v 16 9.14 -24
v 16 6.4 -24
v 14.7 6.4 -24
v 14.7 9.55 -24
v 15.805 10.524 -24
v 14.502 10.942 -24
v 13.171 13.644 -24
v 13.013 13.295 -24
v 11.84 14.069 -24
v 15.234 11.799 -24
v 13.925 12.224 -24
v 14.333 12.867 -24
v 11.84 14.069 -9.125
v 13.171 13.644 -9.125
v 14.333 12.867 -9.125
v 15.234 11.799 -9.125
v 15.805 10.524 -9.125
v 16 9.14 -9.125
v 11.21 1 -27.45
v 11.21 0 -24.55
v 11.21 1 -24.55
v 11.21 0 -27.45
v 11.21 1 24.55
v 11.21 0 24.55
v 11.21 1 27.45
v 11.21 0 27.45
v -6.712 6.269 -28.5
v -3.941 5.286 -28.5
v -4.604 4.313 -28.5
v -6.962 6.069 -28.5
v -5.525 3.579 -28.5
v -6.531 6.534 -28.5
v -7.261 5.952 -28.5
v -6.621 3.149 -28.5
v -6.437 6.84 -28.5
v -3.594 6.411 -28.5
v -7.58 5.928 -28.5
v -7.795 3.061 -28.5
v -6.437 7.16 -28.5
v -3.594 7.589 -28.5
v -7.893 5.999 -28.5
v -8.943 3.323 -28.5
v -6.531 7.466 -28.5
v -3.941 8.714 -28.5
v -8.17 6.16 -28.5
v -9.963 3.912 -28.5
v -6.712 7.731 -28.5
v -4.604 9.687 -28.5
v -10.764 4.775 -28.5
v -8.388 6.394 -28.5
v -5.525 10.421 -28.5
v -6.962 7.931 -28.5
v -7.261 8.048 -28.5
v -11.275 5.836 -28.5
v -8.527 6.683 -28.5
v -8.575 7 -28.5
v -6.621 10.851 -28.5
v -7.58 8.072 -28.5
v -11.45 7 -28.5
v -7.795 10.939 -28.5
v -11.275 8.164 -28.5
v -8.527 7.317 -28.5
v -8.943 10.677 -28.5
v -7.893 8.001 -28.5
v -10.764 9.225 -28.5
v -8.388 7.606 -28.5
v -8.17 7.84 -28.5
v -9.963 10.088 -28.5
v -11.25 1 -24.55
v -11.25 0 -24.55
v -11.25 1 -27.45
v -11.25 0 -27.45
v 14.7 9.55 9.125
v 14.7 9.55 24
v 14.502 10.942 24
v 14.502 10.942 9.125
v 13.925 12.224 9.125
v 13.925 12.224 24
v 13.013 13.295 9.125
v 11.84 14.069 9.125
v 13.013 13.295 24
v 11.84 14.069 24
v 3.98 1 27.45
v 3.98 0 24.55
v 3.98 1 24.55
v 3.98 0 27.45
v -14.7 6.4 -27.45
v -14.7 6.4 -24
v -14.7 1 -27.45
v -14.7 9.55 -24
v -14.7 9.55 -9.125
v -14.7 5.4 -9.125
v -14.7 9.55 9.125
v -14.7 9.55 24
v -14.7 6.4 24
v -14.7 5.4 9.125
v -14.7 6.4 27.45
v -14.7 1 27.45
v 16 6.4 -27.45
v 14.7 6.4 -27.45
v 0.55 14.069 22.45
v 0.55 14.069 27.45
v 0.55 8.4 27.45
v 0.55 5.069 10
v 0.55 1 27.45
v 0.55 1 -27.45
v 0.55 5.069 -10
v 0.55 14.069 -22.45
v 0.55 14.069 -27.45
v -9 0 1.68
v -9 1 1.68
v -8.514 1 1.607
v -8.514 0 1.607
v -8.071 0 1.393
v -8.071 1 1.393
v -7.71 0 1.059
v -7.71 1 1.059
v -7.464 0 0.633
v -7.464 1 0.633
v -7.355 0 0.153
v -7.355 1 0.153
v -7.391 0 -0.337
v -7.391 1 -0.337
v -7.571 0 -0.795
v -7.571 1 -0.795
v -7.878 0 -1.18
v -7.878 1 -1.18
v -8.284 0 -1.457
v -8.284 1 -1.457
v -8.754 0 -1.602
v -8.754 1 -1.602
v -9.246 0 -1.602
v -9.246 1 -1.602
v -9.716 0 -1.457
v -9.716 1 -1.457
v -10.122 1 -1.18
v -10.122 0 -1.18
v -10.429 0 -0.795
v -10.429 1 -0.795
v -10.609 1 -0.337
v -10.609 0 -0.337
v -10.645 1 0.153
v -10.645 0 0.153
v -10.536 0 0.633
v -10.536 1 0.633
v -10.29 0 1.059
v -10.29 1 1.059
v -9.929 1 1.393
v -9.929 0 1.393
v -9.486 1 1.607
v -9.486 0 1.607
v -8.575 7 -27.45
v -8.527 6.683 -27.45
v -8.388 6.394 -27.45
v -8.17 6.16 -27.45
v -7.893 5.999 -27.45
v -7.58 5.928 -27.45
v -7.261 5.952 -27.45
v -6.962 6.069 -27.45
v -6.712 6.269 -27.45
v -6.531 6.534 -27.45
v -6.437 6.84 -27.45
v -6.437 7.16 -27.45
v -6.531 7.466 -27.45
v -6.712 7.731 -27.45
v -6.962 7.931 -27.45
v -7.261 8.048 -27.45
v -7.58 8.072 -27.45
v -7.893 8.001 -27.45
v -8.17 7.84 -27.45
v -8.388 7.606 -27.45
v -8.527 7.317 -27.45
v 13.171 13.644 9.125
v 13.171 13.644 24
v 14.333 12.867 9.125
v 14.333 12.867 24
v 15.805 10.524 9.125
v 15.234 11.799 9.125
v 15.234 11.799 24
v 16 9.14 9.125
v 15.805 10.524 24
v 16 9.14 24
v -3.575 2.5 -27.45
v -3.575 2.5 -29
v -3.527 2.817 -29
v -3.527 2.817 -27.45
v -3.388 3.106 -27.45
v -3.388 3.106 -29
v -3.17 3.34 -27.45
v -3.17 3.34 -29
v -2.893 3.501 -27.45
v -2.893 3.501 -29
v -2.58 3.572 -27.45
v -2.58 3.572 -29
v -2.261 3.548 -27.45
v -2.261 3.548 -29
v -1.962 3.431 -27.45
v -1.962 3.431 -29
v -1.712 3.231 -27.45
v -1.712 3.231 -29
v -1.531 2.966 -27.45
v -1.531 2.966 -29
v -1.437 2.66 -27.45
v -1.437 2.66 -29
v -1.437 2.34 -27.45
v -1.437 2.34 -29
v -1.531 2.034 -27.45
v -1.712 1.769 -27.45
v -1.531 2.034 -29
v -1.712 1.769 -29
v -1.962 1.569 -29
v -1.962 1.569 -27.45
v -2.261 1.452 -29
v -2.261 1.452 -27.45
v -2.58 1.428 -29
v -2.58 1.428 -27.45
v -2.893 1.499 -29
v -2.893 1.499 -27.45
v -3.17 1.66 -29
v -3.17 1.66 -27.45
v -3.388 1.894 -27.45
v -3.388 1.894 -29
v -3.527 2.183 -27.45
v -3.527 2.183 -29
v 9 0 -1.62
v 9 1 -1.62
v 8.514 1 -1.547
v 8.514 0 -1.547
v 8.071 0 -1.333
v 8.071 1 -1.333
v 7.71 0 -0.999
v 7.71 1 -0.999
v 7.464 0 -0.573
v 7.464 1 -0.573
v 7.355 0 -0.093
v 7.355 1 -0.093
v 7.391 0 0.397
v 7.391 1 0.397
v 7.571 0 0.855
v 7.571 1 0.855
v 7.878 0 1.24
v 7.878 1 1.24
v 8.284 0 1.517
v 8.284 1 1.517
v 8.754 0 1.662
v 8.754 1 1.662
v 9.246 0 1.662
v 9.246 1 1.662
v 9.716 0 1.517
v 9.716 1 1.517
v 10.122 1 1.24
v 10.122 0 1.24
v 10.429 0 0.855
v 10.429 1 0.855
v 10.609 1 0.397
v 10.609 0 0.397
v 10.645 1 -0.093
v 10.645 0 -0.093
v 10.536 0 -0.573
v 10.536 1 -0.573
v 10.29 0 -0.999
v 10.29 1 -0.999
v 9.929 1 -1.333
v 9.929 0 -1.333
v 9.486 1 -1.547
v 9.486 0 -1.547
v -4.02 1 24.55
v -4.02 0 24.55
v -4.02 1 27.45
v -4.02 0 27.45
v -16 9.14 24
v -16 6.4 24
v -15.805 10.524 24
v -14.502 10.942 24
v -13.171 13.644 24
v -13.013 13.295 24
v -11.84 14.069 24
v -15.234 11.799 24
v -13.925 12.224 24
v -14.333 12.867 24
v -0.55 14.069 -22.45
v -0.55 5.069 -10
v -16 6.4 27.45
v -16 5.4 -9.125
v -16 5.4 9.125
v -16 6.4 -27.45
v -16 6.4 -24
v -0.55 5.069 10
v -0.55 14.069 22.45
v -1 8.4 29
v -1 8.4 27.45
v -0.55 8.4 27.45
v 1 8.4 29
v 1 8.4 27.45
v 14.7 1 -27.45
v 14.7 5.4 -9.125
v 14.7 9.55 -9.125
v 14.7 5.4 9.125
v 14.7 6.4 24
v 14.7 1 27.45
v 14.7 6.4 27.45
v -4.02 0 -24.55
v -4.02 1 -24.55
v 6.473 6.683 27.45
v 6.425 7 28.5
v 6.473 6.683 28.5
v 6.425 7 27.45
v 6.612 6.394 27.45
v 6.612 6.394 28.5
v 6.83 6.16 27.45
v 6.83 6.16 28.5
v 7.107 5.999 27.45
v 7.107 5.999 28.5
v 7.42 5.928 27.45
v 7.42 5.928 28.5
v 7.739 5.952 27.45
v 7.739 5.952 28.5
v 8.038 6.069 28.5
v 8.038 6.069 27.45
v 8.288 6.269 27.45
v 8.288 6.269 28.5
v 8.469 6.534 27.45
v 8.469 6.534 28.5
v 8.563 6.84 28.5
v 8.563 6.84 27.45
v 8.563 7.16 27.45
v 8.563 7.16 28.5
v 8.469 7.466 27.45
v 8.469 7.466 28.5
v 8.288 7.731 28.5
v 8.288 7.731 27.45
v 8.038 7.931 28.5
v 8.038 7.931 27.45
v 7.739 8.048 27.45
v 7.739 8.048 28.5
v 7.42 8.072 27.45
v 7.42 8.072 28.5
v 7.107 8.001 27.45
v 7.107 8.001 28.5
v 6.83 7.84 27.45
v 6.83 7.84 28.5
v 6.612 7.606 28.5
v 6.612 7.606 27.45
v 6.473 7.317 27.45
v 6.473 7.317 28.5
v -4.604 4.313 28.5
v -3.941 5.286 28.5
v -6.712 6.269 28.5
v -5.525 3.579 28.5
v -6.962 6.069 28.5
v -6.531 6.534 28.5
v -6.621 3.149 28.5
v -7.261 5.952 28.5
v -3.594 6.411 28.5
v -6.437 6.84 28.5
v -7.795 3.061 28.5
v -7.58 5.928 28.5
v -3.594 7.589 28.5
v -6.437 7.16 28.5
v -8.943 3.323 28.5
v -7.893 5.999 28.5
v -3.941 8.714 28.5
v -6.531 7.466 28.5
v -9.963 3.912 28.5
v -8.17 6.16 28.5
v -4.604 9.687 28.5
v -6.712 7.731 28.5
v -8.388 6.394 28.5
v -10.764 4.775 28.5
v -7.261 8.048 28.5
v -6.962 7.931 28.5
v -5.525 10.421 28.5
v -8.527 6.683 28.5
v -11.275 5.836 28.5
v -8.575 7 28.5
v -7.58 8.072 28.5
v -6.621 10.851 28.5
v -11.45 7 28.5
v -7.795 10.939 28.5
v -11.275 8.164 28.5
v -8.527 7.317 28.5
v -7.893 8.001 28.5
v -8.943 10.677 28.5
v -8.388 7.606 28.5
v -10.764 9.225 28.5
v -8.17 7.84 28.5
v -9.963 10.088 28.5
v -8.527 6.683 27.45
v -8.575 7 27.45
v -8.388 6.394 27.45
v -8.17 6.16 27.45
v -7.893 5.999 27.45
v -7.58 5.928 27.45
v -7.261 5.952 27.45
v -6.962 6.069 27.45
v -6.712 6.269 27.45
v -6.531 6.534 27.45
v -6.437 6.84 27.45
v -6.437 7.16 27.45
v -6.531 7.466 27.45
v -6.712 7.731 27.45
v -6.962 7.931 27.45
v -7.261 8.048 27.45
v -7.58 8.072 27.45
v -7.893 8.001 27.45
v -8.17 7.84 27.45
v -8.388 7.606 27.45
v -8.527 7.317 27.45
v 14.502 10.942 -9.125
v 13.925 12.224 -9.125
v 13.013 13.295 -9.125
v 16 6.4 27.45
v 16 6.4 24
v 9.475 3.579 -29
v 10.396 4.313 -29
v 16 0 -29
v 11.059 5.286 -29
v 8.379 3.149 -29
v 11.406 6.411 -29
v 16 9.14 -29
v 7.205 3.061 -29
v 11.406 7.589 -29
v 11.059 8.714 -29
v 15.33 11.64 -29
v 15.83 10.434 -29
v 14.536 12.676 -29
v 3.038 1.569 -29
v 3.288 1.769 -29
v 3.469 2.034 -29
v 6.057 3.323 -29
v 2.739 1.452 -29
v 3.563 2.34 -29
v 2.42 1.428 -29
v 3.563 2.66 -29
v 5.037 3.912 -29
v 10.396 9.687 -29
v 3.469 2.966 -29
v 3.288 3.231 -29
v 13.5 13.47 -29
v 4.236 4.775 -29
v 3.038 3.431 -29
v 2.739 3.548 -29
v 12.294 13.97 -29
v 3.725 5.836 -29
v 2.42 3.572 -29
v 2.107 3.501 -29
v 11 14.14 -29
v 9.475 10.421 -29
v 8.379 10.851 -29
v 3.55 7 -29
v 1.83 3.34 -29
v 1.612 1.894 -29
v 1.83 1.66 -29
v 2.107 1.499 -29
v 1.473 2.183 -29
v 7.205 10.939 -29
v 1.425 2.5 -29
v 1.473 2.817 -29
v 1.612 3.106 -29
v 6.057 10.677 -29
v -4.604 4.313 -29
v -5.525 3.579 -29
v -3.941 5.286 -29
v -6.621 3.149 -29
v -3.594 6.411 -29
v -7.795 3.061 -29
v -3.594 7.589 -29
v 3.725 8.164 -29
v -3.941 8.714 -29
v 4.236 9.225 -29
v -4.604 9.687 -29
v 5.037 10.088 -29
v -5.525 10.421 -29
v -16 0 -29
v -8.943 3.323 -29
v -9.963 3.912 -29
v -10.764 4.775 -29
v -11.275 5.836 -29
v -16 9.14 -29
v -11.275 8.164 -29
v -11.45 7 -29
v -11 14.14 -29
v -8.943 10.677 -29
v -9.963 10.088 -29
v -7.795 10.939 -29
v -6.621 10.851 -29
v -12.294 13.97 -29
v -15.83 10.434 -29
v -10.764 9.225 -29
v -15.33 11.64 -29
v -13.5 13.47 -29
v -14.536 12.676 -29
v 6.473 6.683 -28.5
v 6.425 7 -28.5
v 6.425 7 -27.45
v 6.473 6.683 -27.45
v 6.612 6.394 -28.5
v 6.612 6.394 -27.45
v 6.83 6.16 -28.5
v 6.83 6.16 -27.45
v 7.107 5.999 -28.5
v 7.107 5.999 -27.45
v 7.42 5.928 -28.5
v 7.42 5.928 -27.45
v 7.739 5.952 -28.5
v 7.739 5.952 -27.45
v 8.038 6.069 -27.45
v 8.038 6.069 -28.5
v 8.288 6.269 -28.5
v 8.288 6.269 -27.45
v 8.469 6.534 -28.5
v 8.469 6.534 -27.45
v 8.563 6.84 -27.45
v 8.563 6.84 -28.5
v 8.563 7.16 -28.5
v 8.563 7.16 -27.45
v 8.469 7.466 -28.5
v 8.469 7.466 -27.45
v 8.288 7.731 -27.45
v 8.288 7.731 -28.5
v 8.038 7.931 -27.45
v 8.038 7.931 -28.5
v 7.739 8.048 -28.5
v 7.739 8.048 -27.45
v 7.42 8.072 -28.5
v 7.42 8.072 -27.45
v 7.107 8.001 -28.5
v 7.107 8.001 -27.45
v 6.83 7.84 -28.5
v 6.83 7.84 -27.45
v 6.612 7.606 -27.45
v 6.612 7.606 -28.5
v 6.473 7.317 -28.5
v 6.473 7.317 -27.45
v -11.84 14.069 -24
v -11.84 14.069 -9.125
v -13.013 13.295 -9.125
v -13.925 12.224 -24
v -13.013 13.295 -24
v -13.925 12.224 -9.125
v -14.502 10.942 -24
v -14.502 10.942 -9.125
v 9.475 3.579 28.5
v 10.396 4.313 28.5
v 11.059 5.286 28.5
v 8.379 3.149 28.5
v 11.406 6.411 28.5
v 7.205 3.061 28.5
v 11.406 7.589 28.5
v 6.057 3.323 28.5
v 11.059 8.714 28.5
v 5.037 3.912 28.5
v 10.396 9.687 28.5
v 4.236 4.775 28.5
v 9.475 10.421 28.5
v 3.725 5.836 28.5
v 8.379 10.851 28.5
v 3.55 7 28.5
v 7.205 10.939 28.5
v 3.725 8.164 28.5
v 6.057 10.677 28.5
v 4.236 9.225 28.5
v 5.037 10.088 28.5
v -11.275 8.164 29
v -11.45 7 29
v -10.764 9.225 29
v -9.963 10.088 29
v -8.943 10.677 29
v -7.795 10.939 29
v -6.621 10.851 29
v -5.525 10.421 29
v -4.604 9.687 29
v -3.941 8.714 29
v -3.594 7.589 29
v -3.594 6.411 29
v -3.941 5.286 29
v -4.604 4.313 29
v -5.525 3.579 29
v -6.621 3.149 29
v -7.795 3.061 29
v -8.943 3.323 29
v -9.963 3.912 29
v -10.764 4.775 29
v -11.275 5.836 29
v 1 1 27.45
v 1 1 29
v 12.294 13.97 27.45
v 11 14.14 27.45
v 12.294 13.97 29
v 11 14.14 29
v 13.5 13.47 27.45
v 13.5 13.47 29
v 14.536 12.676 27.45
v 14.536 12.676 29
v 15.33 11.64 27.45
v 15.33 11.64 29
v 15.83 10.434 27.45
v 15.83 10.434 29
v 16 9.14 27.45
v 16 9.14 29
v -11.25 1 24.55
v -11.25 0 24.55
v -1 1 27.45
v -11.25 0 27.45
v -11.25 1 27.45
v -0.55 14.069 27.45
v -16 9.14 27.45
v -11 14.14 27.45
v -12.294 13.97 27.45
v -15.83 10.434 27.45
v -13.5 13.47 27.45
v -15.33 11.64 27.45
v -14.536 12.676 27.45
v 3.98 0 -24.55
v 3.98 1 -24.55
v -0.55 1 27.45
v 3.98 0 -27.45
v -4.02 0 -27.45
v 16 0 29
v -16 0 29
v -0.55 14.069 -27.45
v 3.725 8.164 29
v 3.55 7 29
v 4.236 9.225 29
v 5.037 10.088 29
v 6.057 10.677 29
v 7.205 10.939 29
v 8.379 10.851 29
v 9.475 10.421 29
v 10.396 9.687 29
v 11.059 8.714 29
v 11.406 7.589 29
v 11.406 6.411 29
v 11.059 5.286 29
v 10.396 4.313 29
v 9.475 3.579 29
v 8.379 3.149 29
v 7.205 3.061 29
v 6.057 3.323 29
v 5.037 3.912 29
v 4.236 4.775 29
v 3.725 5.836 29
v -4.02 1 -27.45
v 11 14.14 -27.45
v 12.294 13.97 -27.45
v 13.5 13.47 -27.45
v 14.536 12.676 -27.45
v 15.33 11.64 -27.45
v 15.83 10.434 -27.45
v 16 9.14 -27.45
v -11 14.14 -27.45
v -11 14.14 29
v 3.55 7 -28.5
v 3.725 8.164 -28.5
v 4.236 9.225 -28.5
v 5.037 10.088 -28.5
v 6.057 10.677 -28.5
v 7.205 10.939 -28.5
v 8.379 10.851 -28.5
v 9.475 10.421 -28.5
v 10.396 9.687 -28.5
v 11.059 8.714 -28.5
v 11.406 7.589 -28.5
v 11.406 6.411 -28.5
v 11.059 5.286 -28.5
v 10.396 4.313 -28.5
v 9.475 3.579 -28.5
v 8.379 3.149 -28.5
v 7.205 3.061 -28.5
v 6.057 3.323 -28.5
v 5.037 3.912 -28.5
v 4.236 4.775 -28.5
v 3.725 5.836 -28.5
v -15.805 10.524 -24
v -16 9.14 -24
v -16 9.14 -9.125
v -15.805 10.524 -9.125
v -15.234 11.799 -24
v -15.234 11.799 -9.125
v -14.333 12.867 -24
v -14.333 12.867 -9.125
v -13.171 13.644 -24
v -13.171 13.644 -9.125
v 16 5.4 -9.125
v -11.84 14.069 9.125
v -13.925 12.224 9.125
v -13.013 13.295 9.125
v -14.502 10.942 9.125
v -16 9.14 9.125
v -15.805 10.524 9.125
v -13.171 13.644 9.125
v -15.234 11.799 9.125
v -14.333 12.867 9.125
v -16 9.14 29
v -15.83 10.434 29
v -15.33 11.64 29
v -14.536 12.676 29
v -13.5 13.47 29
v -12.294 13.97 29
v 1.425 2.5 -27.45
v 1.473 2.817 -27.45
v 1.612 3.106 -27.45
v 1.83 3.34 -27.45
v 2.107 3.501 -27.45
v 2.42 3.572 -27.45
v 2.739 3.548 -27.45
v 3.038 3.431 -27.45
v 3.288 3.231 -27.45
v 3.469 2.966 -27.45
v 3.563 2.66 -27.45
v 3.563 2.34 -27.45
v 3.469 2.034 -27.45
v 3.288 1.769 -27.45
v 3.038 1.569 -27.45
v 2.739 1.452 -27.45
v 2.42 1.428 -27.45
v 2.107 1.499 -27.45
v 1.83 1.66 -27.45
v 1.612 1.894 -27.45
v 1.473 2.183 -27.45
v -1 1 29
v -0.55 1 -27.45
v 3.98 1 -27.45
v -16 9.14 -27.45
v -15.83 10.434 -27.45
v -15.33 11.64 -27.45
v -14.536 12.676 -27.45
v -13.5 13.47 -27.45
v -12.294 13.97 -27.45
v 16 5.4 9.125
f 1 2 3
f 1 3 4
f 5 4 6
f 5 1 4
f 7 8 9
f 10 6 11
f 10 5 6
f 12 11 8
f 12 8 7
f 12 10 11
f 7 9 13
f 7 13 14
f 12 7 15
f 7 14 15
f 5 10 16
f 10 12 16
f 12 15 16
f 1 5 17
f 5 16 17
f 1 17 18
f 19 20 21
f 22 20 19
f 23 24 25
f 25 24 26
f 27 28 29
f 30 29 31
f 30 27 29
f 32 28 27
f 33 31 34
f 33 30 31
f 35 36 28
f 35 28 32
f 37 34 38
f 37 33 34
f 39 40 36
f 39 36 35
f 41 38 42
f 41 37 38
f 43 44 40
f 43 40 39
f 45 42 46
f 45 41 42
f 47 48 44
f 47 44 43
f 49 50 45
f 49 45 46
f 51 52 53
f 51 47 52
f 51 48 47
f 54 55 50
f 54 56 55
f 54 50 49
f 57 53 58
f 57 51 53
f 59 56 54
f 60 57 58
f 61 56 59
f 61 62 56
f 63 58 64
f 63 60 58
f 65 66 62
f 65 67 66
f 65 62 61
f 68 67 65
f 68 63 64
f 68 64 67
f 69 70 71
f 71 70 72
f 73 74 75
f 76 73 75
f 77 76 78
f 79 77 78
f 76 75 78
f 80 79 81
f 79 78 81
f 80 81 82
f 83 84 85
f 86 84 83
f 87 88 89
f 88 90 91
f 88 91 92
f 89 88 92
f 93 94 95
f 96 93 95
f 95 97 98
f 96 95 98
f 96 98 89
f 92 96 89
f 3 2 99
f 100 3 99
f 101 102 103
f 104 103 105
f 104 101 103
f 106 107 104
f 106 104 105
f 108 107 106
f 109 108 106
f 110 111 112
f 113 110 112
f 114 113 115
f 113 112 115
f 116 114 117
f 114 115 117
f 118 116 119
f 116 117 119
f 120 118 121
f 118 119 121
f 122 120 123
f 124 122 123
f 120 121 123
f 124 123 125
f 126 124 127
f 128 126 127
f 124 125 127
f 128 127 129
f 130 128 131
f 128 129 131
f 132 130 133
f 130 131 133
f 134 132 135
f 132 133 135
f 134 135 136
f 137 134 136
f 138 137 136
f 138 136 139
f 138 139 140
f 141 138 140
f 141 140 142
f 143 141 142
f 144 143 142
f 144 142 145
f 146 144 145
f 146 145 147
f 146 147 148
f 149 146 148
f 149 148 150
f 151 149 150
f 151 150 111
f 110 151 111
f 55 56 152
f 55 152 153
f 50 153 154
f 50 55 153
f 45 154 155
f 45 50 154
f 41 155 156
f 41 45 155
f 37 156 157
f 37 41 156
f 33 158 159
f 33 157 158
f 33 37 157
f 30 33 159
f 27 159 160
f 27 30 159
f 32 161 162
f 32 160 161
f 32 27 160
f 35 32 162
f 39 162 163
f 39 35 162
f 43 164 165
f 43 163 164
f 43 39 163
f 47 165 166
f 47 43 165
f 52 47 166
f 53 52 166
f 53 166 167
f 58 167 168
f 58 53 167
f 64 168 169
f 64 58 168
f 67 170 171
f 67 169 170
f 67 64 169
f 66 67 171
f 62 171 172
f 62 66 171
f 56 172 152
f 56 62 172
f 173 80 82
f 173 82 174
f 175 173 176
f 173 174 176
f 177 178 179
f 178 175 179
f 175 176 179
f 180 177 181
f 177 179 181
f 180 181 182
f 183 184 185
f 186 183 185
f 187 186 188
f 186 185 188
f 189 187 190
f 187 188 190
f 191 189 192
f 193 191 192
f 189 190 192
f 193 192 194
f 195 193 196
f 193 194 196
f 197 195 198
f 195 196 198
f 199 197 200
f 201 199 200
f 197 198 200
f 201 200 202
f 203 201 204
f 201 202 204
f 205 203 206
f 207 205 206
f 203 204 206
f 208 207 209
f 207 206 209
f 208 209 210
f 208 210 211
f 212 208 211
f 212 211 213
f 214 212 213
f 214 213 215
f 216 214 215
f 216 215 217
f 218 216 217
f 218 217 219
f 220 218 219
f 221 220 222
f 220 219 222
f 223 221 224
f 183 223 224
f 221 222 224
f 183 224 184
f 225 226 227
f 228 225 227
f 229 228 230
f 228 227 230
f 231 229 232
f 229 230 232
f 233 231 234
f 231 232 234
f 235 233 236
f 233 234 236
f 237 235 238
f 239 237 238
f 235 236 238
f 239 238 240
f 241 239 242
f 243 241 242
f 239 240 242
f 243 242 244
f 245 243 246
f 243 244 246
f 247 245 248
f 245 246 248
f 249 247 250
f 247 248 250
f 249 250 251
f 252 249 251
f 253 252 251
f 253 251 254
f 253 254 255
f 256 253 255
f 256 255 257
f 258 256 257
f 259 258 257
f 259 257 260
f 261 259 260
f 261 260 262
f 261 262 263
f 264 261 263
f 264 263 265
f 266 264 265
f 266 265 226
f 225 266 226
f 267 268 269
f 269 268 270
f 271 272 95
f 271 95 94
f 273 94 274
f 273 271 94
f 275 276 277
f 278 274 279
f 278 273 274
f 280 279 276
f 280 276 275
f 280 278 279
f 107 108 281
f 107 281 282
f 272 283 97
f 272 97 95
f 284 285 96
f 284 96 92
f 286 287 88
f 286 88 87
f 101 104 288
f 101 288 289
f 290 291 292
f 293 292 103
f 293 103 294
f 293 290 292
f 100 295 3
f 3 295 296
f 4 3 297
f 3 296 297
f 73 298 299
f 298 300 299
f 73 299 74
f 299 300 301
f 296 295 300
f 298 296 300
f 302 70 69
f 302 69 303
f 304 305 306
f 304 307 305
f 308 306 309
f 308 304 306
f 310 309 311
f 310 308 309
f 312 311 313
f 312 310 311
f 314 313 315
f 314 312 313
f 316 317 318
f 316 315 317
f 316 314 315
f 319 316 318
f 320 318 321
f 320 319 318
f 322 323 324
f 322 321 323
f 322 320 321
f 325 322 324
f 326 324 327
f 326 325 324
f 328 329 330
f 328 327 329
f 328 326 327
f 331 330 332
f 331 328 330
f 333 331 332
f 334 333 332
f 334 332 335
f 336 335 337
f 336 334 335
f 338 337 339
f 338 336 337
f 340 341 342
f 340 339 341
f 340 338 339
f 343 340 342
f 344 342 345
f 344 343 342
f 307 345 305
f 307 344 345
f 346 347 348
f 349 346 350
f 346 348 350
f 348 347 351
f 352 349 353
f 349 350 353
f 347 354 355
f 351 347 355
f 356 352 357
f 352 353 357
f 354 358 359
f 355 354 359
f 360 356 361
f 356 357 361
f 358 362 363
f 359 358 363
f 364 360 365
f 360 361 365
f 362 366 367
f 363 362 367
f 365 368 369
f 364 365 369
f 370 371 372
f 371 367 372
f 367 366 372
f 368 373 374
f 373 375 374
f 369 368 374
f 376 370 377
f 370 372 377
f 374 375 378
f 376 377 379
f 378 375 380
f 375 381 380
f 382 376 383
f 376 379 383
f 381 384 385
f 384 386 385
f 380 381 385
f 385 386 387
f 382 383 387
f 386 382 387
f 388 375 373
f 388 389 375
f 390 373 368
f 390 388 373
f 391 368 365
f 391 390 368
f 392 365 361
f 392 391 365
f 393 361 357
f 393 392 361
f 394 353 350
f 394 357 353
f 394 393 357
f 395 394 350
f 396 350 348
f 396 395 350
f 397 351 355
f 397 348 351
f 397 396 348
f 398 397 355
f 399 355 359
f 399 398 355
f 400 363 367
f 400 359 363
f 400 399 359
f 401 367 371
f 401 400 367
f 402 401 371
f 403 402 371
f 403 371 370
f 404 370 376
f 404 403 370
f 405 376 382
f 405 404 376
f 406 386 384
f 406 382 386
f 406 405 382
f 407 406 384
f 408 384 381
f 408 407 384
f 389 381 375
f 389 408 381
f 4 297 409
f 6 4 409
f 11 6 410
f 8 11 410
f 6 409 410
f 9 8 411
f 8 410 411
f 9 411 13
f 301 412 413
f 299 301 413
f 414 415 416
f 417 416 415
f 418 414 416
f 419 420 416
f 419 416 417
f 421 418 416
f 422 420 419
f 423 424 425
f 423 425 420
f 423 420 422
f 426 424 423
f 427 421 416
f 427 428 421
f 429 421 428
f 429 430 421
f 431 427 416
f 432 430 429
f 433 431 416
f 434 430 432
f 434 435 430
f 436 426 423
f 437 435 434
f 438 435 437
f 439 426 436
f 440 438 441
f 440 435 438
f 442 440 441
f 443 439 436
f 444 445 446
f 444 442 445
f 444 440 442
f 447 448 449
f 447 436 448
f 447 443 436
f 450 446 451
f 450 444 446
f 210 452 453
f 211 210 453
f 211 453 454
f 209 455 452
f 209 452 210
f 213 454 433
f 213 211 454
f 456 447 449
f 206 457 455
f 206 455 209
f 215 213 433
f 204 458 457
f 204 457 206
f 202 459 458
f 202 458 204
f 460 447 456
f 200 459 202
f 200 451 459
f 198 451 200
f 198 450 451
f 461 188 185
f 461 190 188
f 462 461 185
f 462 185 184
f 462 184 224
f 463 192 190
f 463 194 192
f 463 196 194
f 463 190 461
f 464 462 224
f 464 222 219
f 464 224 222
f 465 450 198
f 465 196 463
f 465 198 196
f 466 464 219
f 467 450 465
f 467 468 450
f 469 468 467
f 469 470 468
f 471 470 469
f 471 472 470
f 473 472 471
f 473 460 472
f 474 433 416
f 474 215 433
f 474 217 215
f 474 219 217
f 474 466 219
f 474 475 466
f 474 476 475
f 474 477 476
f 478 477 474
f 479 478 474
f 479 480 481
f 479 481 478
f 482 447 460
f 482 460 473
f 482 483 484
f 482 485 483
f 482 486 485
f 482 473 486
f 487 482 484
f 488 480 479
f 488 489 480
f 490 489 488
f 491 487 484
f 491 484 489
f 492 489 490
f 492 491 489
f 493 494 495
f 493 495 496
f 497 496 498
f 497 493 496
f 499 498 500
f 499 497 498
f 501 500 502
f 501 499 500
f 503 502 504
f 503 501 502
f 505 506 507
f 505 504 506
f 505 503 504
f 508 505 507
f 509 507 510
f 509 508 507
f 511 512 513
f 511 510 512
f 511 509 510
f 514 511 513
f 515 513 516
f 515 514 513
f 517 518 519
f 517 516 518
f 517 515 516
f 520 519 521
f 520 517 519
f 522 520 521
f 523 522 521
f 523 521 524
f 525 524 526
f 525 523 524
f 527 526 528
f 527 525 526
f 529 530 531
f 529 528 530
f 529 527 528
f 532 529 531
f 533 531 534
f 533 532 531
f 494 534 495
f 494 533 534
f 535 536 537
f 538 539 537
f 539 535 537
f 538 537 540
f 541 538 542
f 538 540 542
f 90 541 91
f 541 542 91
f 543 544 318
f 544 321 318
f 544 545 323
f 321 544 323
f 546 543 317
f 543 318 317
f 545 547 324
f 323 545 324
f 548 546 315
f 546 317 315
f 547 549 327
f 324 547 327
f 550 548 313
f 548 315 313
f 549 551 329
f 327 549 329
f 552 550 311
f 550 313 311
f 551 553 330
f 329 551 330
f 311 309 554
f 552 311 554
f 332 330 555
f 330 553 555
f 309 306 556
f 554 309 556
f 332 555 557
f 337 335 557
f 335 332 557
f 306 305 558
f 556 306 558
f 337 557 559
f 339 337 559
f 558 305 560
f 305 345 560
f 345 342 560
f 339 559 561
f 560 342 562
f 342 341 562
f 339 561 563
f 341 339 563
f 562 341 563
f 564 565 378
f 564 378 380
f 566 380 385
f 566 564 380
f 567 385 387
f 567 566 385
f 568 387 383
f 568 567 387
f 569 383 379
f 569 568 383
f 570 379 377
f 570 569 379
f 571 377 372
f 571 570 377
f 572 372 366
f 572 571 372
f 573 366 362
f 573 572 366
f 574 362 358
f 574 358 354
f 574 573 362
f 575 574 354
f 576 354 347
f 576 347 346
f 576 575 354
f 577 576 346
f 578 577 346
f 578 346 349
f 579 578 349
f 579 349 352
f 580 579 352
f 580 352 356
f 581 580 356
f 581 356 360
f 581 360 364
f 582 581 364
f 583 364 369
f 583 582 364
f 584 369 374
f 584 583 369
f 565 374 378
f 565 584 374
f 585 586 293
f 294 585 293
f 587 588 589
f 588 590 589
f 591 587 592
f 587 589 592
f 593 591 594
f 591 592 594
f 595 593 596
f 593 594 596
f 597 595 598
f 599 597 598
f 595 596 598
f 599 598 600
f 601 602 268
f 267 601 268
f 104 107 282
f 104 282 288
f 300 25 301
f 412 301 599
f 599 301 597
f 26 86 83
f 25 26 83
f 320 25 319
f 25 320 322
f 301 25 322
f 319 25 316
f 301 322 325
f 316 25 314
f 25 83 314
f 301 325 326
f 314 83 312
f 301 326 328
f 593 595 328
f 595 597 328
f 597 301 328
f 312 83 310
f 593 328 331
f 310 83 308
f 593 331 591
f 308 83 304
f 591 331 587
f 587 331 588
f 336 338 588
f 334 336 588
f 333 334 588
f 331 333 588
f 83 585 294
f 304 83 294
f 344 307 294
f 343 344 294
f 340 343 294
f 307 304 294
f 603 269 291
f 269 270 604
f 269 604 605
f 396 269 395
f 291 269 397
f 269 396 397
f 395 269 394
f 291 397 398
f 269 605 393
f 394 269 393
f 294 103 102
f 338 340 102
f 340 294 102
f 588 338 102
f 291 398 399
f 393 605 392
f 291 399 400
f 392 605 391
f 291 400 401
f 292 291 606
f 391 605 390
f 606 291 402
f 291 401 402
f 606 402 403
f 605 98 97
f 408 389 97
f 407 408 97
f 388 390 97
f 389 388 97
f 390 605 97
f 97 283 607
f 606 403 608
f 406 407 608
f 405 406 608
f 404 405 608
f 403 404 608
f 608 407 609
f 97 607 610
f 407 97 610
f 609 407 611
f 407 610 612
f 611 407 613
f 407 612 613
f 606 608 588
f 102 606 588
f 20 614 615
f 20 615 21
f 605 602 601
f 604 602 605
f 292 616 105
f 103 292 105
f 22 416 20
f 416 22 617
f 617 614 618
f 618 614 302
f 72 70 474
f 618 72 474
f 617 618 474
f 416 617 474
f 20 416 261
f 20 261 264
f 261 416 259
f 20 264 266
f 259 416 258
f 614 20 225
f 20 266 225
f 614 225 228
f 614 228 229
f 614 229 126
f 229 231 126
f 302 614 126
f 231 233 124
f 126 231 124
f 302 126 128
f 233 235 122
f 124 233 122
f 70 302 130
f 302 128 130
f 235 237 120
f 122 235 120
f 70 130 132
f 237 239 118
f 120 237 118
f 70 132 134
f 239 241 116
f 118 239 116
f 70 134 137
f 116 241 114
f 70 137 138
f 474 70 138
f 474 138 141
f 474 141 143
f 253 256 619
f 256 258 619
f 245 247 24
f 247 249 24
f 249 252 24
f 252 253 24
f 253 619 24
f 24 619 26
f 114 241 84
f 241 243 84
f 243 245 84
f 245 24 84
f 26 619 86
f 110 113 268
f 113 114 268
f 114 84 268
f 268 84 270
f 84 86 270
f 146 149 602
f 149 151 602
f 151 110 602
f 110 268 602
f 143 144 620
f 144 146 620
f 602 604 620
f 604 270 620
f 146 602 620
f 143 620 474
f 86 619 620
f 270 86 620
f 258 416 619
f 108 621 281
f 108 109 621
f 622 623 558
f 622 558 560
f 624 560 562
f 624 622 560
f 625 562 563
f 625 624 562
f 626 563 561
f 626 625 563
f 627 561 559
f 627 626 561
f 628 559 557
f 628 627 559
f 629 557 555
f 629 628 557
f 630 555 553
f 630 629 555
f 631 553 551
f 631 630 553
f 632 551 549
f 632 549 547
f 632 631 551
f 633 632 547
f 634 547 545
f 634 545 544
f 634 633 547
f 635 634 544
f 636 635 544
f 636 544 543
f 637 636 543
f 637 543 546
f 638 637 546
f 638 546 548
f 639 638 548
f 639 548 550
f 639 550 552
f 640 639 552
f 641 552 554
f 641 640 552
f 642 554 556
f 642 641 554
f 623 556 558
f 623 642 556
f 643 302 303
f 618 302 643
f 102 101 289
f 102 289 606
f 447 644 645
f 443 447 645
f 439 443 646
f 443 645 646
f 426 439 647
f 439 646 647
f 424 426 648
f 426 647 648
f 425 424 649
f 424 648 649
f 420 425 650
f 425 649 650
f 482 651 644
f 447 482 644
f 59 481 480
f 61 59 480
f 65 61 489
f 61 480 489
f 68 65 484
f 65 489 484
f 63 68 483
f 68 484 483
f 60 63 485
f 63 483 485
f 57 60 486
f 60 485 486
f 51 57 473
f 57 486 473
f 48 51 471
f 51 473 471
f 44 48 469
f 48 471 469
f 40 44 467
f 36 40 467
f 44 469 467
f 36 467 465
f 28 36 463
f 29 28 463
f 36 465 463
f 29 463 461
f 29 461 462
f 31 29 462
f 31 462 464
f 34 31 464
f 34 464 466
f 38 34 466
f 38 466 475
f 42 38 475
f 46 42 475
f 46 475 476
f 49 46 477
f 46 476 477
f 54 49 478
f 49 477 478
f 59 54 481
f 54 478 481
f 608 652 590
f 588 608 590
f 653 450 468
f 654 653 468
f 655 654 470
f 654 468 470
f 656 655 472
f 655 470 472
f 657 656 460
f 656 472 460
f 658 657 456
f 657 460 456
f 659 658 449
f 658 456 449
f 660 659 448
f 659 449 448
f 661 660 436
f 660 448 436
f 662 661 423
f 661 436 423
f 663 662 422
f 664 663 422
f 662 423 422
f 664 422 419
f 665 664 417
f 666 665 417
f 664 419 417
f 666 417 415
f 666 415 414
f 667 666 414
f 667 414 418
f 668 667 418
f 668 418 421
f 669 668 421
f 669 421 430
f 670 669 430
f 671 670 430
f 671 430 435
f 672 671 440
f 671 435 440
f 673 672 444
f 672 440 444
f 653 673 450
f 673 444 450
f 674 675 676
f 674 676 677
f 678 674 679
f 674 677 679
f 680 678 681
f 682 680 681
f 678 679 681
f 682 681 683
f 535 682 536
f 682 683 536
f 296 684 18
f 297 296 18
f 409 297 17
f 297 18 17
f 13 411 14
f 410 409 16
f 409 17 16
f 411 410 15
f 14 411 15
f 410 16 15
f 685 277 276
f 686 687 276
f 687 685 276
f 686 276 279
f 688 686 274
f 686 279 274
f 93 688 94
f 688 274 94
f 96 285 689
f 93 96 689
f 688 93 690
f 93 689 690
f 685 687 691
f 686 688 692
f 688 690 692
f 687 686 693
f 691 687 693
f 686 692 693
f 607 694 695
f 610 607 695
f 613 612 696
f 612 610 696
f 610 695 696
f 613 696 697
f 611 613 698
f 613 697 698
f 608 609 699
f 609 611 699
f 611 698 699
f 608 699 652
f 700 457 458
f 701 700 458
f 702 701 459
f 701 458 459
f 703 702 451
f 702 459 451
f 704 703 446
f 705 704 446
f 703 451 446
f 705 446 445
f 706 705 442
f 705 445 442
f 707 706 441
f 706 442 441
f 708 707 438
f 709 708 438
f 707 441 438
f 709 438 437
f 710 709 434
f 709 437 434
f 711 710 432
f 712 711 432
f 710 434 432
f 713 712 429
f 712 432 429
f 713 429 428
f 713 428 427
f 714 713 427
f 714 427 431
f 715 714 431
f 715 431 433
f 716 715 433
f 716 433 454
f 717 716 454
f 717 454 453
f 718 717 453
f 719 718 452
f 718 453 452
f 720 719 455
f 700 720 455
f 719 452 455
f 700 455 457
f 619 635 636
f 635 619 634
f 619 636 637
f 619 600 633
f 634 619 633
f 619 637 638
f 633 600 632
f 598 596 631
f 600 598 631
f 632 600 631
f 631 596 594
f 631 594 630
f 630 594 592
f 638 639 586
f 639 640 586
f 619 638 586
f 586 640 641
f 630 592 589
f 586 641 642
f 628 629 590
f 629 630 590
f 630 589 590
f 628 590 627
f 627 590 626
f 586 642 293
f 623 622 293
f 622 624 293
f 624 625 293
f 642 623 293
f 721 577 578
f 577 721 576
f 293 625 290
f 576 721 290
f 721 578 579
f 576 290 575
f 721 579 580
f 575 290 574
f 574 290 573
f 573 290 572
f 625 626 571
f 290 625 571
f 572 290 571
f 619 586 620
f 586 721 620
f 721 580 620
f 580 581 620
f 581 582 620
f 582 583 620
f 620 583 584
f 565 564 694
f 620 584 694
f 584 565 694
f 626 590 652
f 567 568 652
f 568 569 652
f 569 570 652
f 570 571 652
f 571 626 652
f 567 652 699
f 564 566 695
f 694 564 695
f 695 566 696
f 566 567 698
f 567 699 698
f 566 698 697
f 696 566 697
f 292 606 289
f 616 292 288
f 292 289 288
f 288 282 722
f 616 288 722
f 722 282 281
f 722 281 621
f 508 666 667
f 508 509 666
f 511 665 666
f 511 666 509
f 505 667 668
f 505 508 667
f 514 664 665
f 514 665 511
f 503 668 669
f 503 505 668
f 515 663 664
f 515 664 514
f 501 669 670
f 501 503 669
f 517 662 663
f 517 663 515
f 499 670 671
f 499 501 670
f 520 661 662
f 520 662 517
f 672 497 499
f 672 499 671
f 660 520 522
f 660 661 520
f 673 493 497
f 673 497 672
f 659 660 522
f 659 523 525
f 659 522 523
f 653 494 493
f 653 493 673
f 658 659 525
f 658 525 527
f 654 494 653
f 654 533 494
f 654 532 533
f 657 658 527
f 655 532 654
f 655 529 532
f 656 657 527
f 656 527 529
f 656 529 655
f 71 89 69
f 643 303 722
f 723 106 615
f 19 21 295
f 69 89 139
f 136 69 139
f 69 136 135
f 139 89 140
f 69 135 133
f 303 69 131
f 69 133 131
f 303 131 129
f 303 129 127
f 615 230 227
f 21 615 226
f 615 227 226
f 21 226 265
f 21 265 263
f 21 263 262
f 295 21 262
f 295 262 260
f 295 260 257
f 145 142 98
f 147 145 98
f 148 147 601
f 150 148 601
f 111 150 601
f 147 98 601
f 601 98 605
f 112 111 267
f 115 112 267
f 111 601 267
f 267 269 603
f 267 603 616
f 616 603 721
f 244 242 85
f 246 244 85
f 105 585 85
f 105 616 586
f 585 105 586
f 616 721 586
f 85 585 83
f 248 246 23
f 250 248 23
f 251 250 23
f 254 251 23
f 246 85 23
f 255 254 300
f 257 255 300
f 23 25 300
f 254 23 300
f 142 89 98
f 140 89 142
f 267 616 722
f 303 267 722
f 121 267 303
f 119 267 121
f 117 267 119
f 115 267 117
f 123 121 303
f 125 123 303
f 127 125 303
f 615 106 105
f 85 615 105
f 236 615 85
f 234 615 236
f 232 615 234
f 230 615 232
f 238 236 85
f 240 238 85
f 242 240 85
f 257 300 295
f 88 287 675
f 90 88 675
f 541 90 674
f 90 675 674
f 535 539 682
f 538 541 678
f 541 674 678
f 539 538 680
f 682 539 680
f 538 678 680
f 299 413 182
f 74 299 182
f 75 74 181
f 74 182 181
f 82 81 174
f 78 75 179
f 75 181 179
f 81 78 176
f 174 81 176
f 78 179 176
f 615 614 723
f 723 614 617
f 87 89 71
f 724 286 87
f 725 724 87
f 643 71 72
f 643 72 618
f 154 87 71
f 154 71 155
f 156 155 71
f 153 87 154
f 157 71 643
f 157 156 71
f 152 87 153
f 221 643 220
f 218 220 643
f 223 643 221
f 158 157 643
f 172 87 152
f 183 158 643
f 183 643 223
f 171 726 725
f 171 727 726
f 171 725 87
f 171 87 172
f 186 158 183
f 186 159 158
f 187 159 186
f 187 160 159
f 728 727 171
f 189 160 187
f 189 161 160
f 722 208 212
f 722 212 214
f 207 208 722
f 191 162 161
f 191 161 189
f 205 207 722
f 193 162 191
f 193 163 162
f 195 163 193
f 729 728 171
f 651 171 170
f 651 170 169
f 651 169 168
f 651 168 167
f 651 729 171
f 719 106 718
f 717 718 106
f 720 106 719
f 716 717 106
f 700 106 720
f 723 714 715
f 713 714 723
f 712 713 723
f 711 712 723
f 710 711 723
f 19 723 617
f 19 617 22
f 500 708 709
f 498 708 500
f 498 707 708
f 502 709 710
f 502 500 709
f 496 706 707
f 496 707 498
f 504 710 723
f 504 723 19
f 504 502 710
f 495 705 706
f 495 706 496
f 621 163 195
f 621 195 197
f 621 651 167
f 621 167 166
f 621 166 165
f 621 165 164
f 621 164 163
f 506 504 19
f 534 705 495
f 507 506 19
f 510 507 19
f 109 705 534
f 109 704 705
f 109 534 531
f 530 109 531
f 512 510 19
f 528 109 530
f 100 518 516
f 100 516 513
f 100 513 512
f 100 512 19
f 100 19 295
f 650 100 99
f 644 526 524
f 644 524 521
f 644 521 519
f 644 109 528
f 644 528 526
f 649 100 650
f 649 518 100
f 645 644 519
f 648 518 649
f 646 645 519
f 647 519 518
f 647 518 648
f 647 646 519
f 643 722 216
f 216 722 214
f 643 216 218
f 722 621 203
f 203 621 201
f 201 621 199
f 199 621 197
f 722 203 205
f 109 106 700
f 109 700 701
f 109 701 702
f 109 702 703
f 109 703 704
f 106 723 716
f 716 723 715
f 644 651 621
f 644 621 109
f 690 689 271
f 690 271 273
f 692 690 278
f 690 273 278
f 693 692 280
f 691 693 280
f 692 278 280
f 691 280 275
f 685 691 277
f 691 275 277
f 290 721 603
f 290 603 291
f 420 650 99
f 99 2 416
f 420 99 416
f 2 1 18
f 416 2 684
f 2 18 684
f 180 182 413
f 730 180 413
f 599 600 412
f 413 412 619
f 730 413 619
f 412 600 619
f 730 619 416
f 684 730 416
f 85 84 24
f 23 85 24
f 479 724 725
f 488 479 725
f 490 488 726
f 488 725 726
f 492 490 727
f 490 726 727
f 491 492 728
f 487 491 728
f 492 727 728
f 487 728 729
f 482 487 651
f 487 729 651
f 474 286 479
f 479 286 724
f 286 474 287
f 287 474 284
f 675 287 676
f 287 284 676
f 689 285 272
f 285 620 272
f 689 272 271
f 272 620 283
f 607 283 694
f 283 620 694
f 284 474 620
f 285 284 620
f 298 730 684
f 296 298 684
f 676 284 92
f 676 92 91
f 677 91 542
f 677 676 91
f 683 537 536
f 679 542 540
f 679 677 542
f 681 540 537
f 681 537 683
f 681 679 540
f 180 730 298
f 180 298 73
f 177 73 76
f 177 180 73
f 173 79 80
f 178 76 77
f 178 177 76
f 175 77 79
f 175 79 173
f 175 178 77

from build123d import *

# Parameters (mm, degrees)
SKETCH1_R           = 1.075
BOSS_EXTRUDE1_DEPTH = 29
CUT_EXTRUDE7_START  = -1.55
CUT_EXTRUDE7_DEPTH  = 54.9
BOSS_EXTRUDE2_DEPTH = 0.55
CUT_EXTRUDE8_REACH  = 47.442
SKETCH4_W           = 3.45
SKETCH4_H           = 15
SKETCH4_W_2         = 18.25
SKETCH4_H_2         = 16
SKETCH5_R           = 3.95
CUT_EXTRUDE9_DEPTH  = 0.5
SKETCH6_R           = 1.65
CUT_EXTRUDE10_DEPTH = 36.632283115
SKETCH10_W          = 2
SKETCH10_H          = 7.4
CUT_EXTRUDE11_DEPTH = 1.55
SKETCH12_R          = 1.075
CUT_EXTRUDE12_DEPTH = 1.55
SKETCH14_W          = 7.23
SKETCH14_H          = 2.9
CUT_EXTRUDE13_DEPTH = 1


with BuildPart() as part:
    # Sketch1 → Boss-Extrude1 (new, symmetric)
    with BuildSketch(Plane.XY):
        with BuildLine():
            Line((-11, 14.14), (11, 14.14))
            ThreePointArc((11, 14.14), (14.535533906, 12.675533906), (16, 9.14))
            Line((16, 9.14), (16, 0))
            Line((16, 0), (-16, 0))
            Line((-16, 0), (-16, 9.14))
            ThreePointArc((-16, 9.14), (-14.535533906, 12.675533906), (-11, 14.14))
        make_face()
        with Locations(Location((-7.5, 7, 0), (0, 0, 180))):
            Circle(SKETCH1_R, mode=Mode.SUBTRACT)
        with Locations(Location((7.5, 7, 0), (0, 0, 180))):
            Circle(SKETCH1_R, mode=Mode.SUBTRACT)
    extrude(amount=BOSS_EXTRUDE1_DEPTH, both=True)

    # Sketch2 → Cut-Extrude7 (cut)
    with BuildSketch(Plane.XY.offset(29).offset(CUT_EXTRUDE7_START)):
        with BuildLine():
            Line((-14.7, 1), (14.7, 1))
            Line((14.7, 1), (14.7, 9.55))
            ThreePointArc((14.7, 9.55), (13.235533906, 13.085533906), (9.7, 14.55))
            Line((9.7, 14.55), (-9.7, 14.55))
            ThreePointArc((-9.7, 14.55), (-13.235533906, 13.085533906), (-14.7, 9.55))
            Line((-14.7, 9.55), (-14.7, 1))
        make_face()
    extrude(amount=-CUT_EXTRUDE7_DEPTH, mode=Mode.SUBTRACT)

    # Sketch3 → Boss-Extrude2 (add, symmetric)
    with BuildSketch(Plane(origin=(0, 0, 0), x_dir=(0, 0, -1), z_dir=(1, 0, 0))):
        Polygon((27.45, 14.068958196), (22.45, 14.068958196), (10, 5.068958196), (-10, 5.068958196), (-22.45, 14.068958196), (-27.45, 14.068958196), (-27.45, 1), (27.45, 1), align=None)
    extrude(amount=BOSS_EXTRUDE2_DEPTH, both=True)

    # Sketch4 → Cut-Extrude8 (cut, up to next)
    with BuildSketch(Plane(origin=(16, 0, 0), x_dir=(0, 0, -1), z_dir=(1, 0, 0)), mode=Mode.PRIVATE) as cut_extrude8_sk1:
        with Locations((-25.725, 13.9)):
            Rectangle(SKETCH4_W, SKETCH4_H)
    cut_extrude8_tool1 = extrude(cut_extrude8_sk1.sketch, amount=-CUT_EXTRUDE8_REACH, mode=Mode.PRIVATE) & part.part
    # Sketch4 → Cut-Extrude8 (cut, up to next)
    with BuildSketch(Plane(origin=(16, 0, 0), x_dir=(0, 0, -1), z_dir=(1, 0, 0)), mode=Mode.PRIVATE) as cut_extrude8_sk2:
        with Locations((0, 13.4)):
            Rectangle(SKETCH4_W_2, SKETCH4_H_2)
    cut_extrude8_tool2 = extrude(cut_extrude8_sk2.sketch, amount=-CUT_EXTRUDE8_REACH, mode=Mode.PRIVATE) & part.part
    # Sketch4 → Cut-Extrude8 (cut, up to next)
    with BuildSketch(Plane(origin=(16, 0, 0), x_dir=(0, 0, -1), z_dir=(1, 0, 0)), mode=Mode.PRIVATE) as cut_extrude8_sk3:
        with Locations((25.725, 13.9)):
            Rectangle(SKETCH4_W, SKETCH4_H)
    cut_extrude8_tool3 = extrude(cut_extrude8_sk3.sketch, amount=-CUT_EXTRUDE8_REACH, mode=Mode.PRIVATE) & part.part
    cut_extrude8_1 = cut_extrude8_tool1.solids().sort_by_distance((16, 13.9, 25.725))[0]
    add(cut_extrude8_1, mode=Mode.SUBTRACT)
    cut_extrude8_2 = cut_extrude8_tool2.solids().sort_by_distance((16, 13.4, 0))[0]
    add(cut_extrude8_2, mode=Mode.SUBTRACT)
    cut_extrude8_3 = cut_extrude8_tool3.solids().sort_by_distance((16, 13.9, -25.725))[0]
    add(cut_extrude8_3, mode=Mode.SUBTRACT)
    cut_extrude8 = cut_extrude8_1 + cut_extrude8_2 + cut_extrude8_3  # Cut-Extrude8 as one shape, for the pattern or mirror that repeats it

    # Mirror1: Cut-Extrude8 across plane
    add(cut_extrude8.mirror(Plane(origin=(0, 0, 0), x_dir=(0, 0, 1), z_dir=(1, 0, 0))), mode=Mode.SUBTRACT)

    # Sketch5 → Cut-Extrude9 (cut)
    with BuildSketch(Plane(origin=(0, 0, -29), x_dir=(-1, 0, 0), z_dir=(0, 0, -1))):
        with Locations((-7.5, 7)):
            Circle(SKETCH5_R)
        with Locations((7.5, 7)):
            Circle(SKETCH5_R)
    cut_extrude9 = extrude(amount=-CUT_EXTRUDE9_DEPTH, mode=Mode.SUBTRACT)

    # Mirror2: Cut-Extrude9 across plane
    add(cut_extrude9.mirror(Plane.XY), mode=Mode.SUBTRACT)

    # Sketch6 → Cut-Extrude10 (cut, through all)
    with BuildSketch(Plane(origin=(0, 1, 0), x_dir=(1, 0, 0), z_dir=(0, 1, 0))):
        with Locations(Location((-9, -0.03, 0), (0, 0, 270))):
            Circle(SKETCH6_R)
        with Locations(Location((9, -0.03, 0), (0, 0, 90))):
            Circle(SKETCH6_R)
    extrude(amount=-CUT_EXTRUDE10_DEPTH, mode=Mode.SUBTRACT)

    # Sketch10 → Cut-Extrude11 (cut)
    with BuildSketch(Plane.XY.offset(29)):
        with Locations((0, 4.7)):
            Rectangle(SKETCH10_W, SKETCH10_H)
    extrude(amount=-CUT_EXTRUDE11_DEPTH, mode=Mode.SUBTRACT)

    # Sketch12 → Cut-Extrude12 (cut)
    with BuildSketch(Plane(origin=(0, 0, -29), x_dir=(-1, 0, 0), z_dir=(0, 0, -1))):
        with Locations((-2.5, 2.5)):
            Circle(SKETCH12_R)
        with Locations((2.5, 2.5)):
            Circle(SKETCH12_R)
    extrude(amount=-CUT_EXTRUDE12_DEPTH, mode=Mode.SUBTRACT)

    # Sketch14 → Cut-Extrude13 (cut)
    with BuildSketch(Plane.XZ):
        with Locations((-7.635, 26)):
            Rectangle(SKETCH14_W, SKETCH14_H)
        with Locations((7.595, 26)):
            Rectangle(SKETCH14_W, SKETCH14_H)
    cut_extrude13 = extrude(amount=-CUT_EXTRUDE13_DEPTH, mode=Mode.SUBTRACT)

    # Mirror3: Cut-Extrude13 across plane
    add(cut_extrude13.mirror(Plane.XY), mode=Mode.SUBTRACT)


solid = part.part
